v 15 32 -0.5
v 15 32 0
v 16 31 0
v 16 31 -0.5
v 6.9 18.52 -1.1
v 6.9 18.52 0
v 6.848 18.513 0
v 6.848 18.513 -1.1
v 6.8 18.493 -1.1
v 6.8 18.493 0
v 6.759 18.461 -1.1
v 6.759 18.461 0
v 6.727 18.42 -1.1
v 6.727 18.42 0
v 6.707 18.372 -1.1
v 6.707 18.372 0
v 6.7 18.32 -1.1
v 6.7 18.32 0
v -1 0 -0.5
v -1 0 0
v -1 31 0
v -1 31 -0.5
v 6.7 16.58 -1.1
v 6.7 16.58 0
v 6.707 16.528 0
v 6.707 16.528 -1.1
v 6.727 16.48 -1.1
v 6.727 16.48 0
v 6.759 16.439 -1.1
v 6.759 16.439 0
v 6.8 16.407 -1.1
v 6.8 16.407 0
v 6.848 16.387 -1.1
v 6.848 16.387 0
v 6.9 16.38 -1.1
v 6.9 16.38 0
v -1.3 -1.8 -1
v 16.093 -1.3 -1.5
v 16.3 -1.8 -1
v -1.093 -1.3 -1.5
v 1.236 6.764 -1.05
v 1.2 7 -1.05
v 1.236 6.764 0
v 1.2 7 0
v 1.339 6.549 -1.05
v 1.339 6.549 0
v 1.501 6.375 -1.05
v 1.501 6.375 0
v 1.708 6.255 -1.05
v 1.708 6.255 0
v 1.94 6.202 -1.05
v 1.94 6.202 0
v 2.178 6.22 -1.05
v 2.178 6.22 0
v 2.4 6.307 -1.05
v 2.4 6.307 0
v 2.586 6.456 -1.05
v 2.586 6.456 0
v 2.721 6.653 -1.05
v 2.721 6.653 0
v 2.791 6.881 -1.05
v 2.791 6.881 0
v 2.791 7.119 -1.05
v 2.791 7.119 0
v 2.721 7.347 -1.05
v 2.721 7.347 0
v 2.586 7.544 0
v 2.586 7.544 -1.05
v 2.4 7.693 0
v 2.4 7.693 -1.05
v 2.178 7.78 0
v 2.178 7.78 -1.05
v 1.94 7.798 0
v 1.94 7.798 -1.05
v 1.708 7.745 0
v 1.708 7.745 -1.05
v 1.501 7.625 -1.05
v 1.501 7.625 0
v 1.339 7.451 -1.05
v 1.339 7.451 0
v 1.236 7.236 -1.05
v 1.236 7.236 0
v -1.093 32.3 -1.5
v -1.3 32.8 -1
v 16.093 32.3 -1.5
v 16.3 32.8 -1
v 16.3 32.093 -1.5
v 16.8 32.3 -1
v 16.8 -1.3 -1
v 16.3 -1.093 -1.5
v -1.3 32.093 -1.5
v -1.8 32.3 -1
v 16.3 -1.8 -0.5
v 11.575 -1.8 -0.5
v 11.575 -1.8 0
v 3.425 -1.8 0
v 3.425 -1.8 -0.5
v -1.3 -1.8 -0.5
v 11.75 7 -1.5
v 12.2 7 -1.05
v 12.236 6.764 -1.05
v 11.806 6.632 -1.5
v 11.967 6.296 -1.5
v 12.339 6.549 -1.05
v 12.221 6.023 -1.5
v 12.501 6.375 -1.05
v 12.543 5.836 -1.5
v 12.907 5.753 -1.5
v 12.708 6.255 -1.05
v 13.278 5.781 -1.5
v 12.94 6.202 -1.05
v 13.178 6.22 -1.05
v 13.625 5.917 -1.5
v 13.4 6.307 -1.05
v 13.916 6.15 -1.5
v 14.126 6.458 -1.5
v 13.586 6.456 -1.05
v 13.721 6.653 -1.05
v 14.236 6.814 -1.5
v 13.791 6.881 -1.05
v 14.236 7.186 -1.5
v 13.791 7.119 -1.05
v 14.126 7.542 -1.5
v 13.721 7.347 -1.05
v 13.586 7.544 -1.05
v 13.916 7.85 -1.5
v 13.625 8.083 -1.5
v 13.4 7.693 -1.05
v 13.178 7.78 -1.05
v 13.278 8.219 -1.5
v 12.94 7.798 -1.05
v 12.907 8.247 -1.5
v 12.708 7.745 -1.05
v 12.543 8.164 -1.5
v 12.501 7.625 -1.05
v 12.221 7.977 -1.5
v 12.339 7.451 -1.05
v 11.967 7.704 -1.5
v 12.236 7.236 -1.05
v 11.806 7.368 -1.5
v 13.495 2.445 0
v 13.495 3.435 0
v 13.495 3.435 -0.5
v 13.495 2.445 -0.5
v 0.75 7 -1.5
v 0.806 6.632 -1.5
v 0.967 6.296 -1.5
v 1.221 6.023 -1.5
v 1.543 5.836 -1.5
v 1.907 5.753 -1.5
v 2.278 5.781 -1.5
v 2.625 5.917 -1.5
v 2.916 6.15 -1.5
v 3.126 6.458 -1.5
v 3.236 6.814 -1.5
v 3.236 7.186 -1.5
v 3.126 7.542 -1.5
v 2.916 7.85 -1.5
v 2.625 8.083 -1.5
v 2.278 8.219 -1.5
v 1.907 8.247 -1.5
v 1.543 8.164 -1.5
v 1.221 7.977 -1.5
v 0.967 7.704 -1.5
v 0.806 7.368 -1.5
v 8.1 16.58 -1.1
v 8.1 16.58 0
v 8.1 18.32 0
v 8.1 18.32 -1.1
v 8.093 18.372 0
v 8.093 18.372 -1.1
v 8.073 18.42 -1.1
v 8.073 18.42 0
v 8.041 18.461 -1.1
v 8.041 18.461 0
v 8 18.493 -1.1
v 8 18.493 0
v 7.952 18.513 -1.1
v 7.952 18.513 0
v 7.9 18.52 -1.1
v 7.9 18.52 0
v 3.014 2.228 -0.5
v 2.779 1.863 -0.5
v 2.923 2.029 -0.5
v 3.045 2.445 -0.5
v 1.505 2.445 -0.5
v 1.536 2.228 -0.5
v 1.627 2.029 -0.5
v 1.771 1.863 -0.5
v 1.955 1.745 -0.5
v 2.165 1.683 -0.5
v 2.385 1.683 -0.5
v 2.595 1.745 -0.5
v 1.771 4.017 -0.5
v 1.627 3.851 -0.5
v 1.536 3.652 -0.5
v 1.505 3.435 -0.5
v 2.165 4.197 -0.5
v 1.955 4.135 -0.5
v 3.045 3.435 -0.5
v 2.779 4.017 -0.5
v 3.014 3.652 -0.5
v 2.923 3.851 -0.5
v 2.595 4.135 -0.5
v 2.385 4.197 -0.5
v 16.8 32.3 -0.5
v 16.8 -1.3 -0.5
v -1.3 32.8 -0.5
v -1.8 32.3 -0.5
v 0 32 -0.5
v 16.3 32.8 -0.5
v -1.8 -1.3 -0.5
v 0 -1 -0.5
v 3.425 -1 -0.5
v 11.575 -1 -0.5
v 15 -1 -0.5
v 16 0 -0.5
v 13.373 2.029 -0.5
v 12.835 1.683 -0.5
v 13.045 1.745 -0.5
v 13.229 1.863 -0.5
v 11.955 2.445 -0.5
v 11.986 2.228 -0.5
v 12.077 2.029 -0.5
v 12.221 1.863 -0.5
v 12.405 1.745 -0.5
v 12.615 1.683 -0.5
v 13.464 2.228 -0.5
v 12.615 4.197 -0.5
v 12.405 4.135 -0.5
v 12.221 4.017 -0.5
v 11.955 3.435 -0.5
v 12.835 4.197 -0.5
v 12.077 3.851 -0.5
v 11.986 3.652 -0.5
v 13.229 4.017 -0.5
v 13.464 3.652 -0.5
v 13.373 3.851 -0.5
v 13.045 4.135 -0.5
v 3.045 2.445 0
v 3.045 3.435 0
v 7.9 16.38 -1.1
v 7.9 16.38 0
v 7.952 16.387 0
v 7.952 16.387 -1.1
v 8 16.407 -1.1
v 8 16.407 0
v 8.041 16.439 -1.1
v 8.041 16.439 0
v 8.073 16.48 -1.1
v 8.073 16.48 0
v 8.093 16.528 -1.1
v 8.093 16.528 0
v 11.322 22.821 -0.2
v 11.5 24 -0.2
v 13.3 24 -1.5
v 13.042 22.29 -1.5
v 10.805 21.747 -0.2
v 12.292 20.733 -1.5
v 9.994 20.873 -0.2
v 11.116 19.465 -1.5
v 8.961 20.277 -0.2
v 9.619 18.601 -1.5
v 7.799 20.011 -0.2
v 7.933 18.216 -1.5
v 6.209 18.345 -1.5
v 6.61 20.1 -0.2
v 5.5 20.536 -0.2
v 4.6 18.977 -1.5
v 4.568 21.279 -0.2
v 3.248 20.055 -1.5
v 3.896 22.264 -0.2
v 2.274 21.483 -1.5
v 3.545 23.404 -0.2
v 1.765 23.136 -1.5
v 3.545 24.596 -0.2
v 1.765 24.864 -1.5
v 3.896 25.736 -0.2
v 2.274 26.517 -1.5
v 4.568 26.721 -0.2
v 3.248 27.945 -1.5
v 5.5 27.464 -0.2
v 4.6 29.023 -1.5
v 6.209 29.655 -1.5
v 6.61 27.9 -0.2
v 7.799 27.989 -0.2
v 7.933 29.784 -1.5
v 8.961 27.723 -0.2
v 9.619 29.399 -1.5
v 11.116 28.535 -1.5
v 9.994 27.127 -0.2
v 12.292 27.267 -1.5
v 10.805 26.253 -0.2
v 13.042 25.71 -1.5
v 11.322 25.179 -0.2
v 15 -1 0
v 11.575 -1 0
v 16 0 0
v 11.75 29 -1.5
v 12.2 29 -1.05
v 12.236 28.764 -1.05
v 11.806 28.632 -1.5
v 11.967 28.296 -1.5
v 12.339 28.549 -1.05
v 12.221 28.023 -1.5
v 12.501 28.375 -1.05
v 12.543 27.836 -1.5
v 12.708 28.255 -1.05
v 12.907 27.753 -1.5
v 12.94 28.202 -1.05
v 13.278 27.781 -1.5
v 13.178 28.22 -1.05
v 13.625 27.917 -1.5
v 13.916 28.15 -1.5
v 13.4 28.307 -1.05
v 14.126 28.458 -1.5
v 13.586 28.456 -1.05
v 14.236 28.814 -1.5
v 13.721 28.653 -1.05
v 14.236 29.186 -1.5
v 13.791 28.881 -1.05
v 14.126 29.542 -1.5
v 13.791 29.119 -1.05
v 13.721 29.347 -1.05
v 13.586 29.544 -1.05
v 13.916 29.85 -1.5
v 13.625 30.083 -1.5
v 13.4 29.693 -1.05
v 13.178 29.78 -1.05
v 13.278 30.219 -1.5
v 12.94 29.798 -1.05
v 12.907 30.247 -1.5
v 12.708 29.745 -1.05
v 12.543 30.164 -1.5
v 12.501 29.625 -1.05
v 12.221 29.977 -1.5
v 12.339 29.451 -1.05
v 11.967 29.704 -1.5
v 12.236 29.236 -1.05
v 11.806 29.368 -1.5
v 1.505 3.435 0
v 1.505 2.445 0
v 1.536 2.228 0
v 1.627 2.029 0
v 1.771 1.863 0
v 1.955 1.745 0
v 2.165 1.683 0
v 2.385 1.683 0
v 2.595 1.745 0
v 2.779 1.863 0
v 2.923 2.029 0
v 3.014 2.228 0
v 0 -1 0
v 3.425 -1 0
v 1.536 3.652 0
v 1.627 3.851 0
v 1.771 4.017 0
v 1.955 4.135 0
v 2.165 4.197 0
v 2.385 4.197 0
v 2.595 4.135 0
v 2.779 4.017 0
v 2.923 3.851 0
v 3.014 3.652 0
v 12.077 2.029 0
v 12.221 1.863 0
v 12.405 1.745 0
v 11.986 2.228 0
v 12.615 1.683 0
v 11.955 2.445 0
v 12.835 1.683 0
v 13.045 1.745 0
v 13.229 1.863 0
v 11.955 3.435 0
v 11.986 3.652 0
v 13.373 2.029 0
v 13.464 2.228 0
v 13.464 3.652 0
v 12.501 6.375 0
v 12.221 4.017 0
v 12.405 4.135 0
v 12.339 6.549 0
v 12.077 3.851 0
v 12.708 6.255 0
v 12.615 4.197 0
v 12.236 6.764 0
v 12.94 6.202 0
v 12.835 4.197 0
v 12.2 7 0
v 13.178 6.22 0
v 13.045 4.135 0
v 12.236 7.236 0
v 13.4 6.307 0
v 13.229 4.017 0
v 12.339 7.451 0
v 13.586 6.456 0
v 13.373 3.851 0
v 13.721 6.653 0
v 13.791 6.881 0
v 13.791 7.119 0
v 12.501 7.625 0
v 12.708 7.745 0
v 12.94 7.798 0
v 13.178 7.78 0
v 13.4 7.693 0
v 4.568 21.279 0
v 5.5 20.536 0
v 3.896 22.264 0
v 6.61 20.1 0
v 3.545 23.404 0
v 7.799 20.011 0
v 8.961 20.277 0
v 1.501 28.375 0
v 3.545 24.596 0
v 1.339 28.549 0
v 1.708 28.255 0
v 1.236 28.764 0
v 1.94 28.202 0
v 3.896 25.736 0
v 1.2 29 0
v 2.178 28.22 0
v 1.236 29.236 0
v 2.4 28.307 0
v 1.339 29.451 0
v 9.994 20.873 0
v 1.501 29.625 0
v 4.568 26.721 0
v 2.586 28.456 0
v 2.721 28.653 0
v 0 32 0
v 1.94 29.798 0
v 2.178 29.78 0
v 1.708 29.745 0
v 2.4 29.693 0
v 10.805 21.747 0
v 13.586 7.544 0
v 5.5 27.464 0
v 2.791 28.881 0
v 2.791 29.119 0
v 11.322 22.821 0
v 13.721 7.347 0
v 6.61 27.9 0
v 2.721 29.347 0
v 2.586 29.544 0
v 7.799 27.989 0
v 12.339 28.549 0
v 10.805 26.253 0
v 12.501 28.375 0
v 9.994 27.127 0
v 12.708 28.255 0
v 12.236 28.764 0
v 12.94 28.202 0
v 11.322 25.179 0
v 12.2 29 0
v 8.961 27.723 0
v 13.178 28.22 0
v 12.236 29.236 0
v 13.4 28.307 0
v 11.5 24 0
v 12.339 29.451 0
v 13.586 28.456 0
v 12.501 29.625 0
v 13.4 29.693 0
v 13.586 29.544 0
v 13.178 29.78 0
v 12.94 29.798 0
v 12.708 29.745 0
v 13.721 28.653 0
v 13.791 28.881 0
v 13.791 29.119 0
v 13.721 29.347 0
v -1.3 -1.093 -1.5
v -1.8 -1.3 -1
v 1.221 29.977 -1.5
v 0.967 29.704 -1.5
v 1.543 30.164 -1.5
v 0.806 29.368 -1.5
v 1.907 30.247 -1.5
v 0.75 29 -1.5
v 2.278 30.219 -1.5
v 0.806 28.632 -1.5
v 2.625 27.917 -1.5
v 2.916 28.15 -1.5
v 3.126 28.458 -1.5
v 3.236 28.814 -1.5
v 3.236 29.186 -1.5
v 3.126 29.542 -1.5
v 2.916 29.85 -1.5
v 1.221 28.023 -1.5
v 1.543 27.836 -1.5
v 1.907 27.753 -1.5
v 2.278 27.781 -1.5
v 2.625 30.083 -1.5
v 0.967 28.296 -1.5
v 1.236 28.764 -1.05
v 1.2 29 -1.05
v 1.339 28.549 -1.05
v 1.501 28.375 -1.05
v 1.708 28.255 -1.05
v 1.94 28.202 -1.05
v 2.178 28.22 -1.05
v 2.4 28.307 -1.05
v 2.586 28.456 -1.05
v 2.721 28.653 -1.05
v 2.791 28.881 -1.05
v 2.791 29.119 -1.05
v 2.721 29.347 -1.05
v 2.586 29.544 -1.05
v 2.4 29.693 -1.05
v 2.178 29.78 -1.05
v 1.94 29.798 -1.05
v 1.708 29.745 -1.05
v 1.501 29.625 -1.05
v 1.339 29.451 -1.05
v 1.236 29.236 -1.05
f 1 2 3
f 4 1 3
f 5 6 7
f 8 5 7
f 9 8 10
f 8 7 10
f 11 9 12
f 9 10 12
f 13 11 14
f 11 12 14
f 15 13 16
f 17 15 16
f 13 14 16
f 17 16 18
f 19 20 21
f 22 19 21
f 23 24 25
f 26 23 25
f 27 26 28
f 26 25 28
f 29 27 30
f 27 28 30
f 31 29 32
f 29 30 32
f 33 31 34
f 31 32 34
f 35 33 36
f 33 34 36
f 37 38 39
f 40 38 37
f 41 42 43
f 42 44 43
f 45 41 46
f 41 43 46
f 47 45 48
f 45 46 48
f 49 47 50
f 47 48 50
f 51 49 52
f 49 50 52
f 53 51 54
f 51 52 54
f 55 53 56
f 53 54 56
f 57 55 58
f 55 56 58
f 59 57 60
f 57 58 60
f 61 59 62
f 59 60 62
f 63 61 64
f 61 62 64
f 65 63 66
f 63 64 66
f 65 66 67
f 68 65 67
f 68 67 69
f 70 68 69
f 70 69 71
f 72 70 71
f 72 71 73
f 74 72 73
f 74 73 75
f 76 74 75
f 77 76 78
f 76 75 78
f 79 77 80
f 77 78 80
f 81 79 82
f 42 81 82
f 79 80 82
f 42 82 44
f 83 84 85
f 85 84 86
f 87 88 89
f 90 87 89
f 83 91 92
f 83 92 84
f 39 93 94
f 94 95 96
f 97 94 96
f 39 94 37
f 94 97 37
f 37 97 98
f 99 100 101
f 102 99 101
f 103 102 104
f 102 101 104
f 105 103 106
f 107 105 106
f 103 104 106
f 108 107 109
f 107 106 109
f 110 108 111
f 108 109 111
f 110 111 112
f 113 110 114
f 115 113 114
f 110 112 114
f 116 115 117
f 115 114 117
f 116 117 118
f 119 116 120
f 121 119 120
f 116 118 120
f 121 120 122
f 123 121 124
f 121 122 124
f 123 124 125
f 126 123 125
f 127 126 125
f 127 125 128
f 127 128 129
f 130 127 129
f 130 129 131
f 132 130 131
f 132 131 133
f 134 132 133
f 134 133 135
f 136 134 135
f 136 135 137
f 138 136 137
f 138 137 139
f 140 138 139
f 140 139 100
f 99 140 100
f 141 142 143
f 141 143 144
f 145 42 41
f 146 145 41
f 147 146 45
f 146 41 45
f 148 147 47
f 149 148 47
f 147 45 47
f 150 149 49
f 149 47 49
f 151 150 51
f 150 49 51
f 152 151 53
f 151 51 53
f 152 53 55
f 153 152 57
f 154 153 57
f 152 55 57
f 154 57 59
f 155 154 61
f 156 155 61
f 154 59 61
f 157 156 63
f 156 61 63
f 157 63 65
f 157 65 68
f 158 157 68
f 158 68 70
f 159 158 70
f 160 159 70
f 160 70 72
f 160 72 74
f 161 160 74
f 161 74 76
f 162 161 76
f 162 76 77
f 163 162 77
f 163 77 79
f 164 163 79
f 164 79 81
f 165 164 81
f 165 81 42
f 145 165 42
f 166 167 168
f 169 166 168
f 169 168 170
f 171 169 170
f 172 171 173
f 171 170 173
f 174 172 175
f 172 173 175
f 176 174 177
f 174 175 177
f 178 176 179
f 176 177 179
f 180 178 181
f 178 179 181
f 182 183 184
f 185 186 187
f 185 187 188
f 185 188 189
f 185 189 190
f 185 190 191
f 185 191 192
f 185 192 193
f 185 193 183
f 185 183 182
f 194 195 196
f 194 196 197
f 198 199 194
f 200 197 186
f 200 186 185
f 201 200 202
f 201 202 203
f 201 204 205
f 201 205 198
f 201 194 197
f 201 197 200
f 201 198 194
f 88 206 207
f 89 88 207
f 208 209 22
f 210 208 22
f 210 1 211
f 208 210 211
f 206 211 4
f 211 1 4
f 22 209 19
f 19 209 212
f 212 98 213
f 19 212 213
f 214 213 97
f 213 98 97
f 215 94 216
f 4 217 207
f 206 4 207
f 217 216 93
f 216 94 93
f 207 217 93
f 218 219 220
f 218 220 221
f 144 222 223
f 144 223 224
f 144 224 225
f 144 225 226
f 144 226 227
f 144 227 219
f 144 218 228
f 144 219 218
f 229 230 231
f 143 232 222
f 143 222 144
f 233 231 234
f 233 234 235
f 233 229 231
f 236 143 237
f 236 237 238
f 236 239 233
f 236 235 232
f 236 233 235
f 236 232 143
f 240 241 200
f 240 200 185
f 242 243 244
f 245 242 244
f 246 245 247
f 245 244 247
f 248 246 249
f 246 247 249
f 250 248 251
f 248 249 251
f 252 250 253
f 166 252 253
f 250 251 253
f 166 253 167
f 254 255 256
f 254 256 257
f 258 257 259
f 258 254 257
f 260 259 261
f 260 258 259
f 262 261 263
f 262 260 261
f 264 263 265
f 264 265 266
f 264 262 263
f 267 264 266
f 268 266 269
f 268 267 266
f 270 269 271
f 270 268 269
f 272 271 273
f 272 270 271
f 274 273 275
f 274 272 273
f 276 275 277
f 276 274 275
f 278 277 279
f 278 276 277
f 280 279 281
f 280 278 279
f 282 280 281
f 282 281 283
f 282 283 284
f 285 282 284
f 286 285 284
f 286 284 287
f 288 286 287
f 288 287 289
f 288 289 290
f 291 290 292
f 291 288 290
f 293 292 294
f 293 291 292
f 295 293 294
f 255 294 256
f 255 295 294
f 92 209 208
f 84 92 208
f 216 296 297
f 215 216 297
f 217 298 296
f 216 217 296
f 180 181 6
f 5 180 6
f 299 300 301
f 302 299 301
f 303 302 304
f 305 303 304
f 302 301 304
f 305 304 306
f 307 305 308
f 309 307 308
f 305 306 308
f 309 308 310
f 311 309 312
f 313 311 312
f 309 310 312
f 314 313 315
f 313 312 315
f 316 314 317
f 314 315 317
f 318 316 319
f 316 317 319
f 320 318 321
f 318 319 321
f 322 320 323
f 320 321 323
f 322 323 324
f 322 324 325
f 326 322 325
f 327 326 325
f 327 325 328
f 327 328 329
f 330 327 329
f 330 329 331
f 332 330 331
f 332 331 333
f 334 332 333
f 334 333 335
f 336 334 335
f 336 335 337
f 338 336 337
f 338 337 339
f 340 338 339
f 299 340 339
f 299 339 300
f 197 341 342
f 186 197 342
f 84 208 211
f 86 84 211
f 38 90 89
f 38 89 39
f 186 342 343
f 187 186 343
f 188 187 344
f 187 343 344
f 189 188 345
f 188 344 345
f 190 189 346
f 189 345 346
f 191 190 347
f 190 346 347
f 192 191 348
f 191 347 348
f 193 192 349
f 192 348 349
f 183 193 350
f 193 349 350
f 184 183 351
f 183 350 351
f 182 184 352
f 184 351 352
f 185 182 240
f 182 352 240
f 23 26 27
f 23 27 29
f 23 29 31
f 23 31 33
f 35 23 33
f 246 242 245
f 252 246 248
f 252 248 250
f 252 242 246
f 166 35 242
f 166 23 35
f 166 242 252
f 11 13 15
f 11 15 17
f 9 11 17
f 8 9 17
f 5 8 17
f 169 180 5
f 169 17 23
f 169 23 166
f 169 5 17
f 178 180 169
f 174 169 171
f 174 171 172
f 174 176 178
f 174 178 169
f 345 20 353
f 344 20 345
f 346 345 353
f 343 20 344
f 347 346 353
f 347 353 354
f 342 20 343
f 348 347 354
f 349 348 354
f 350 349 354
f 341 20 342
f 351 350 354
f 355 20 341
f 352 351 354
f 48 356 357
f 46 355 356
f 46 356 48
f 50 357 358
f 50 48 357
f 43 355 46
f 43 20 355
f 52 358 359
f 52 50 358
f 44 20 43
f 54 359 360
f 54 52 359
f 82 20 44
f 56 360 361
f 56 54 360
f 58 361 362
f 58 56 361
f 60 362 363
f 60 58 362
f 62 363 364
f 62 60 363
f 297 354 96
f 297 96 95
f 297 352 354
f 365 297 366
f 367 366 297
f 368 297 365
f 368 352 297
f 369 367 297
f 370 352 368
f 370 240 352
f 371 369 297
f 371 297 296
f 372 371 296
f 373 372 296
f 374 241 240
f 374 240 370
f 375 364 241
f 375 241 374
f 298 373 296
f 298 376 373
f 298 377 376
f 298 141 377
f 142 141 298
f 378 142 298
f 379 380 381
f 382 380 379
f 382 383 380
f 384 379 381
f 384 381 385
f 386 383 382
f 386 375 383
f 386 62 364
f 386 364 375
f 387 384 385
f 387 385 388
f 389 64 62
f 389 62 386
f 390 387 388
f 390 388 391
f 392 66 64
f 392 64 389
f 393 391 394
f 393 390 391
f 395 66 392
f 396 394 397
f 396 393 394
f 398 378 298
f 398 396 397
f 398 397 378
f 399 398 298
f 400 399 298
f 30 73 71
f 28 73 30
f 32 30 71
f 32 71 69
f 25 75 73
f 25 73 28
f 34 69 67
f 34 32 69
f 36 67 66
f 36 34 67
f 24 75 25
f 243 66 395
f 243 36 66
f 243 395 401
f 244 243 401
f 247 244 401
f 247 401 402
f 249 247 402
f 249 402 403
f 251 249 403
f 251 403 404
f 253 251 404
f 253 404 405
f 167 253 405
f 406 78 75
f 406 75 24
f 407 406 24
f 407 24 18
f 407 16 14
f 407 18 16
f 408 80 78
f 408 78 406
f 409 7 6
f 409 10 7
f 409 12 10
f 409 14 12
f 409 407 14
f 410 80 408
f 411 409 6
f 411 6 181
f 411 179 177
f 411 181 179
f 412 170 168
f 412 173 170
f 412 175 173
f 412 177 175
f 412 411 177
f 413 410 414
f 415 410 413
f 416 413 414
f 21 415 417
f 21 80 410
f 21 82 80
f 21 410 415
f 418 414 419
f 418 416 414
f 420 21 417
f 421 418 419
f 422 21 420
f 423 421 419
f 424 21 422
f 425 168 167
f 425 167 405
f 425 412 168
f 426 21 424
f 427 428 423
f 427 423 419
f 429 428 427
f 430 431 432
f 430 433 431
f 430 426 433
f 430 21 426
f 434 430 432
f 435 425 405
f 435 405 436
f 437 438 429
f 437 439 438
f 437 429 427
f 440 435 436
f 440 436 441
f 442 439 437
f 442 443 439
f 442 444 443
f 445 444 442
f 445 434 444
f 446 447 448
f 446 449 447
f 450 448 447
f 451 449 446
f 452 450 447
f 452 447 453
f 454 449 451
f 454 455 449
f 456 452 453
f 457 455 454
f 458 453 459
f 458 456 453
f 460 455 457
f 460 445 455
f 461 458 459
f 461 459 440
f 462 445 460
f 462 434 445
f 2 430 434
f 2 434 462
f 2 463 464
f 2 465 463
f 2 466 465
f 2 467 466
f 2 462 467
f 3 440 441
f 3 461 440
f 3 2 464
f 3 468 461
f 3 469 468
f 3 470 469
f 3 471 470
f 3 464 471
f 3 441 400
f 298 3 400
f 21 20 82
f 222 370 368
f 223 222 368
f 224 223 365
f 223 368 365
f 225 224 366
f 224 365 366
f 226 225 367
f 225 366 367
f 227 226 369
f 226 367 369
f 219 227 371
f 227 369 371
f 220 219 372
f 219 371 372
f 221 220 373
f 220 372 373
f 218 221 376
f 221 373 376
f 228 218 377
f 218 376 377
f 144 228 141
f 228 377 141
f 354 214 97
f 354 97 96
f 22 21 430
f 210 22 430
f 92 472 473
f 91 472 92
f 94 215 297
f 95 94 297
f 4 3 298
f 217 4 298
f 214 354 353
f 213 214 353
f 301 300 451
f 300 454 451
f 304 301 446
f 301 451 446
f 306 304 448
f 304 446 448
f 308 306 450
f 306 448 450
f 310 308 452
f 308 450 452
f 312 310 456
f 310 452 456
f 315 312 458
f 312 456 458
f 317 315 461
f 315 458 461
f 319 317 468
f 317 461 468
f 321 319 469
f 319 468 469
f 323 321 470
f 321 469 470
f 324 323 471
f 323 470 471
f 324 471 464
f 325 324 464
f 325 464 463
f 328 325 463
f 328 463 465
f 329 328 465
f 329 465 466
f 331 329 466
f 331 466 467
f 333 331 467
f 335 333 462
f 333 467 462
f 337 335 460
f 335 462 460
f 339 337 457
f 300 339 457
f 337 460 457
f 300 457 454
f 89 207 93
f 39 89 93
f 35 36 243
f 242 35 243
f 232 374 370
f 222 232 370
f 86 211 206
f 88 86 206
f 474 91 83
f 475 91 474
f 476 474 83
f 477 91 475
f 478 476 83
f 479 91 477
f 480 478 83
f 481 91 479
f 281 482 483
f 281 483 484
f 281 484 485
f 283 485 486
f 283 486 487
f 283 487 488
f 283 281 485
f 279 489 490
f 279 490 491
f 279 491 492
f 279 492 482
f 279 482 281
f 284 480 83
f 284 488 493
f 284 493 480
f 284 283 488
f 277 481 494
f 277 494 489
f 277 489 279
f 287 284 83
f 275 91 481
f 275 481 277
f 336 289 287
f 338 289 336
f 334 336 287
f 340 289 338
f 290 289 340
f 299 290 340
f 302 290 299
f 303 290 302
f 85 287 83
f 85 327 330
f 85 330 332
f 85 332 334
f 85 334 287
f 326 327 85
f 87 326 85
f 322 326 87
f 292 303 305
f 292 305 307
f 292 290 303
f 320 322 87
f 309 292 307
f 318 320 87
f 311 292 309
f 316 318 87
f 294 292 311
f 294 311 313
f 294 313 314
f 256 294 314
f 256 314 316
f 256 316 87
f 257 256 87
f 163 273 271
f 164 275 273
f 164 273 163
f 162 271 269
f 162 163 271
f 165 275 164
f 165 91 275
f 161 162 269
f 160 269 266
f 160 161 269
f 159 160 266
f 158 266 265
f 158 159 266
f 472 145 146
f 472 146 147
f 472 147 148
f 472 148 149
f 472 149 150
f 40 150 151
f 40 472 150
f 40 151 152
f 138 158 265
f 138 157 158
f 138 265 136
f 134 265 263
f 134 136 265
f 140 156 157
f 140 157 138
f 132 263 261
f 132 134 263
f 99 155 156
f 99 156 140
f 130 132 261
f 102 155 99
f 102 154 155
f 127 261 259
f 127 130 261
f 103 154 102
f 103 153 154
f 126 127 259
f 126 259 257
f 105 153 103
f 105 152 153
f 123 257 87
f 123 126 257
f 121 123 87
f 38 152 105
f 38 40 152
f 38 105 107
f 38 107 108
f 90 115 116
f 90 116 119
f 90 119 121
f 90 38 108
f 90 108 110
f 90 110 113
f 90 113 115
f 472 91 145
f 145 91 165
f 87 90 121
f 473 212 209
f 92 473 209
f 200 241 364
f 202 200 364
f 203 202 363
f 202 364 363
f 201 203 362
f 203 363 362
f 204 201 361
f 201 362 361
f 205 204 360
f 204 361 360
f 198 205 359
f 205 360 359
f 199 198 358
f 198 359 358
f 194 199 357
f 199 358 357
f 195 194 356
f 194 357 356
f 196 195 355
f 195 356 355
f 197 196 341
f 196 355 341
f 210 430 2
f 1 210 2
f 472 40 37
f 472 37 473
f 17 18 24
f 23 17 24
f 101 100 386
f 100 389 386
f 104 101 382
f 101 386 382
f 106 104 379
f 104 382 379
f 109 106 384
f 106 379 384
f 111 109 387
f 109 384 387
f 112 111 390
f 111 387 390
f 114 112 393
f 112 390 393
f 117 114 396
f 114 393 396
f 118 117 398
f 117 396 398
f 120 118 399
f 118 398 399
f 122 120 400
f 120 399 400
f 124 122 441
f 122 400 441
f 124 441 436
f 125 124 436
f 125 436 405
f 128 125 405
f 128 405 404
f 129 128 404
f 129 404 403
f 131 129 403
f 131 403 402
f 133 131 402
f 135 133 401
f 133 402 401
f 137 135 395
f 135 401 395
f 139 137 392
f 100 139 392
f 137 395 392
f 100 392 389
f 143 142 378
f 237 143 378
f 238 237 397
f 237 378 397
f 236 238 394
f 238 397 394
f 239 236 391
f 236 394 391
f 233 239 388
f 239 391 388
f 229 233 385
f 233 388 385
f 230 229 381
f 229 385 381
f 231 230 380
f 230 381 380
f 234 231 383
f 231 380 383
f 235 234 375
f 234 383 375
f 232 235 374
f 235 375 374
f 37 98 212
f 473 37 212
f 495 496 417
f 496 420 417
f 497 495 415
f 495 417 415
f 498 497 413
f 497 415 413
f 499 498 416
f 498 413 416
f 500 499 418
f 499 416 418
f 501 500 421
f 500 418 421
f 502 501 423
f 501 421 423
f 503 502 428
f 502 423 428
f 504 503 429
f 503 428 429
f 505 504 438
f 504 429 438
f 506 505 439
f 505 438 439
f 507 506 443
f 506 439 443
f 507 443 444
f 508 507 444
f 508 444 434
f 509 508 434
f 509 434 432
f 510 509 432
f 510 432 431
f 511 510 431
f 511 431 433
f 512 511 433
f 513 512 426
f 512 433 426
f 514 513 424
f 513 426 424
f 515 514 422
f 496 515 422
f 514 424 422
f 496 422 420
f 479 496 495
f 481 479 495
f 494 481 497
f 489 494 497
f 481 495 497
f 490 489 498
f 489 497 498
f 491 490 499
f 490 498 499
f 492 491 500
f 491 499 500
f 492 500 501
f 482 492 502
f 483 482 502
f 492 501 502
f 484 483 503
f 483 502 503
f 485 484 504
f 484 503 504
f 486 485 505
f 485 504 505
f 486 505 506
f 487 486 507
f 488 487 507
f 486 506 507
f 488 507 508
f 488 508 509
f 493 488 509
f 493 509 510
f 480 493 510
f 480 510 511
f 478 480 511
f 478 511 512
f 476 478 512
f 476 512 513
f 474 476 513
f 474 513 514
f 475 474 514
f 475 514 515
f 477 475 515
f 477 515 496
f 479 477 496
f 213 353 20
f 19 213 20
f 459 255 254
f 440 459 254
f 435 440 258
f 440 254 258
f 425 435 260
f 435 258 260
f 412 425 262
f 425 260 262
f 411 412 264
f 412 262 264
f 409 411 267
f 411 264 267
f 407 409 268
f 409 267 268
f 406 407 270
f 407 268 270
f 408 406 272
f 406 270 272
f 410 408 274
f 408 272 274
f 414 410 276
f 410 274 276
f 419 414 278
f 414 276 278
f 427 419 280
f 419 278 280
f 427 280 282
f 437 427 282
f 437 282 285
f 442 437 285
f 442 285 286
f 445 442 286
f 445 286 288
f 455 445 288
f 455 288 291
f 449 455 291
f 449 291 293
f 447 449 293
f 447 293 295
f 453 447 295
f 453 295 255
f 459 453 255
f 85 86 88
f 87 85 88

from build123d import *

# Parameters (mm, degrees)
PAD007_DEPTH     = 0.5
PAD008_DEPTH     = 1
SKETCH013_W      = 8.15
SKETCH013_H      = 0.5
PAD009_DEPTH     = 0.8
CHAMFER002_SIZE  = 0.5
HOLE_D           = 1.6
HOLE_DEPTH       = 25
HOLE_CSINK_D     = 2.5
HOLE_CSINK_ANGLE = 90
POCKET003_DEPTH  = 1.1
SKETCH016_R      = 4
POCKET004_DEPTH  = 5
POCKET005_DEPTH  = 0.5
CHAMFER006_SIZE2 = 1.3
CHAMFER006_SIZE  = 1.8


with BuildPart() as part:
    # Sketch011 (on Face14 of Binder001) → Pad007 (new body)
    with BuildSketch(Plane(origin=(0, 0, 0), x_dir=(1, 0, 0), z_dir=(0, 0, -1))):
        Polygon((16, -31), (16, 0), (15, 1), (0, 1), (-1, 0), (-1, -31), (0, -32), (15, -32), align=None)
    extrude(amount=PAD007_DEPTH)

    # Sketch012 (on Face10 of Pad007) → Pad008 (join)
    with BuildSketch(Plane(origin=(0, 0, -0.5), x_dir=(1, 0, 0), z_dir=(0, 0, -1))):
        Polygon((-1.3, 1.8), (-1.8, 1.3), (-1.8, -32.3), (-1.3, -32.8), (16.3, -32.8), (16.8, -32.3), (16.8, 1.3), (16.3, 1.8), align=None)
    extrude(amount=PAD008_DEPTH)

    # Sketch013 (on Face7 of Pad008) → Pad009 (join)
    with BuildSketch(Plane.XZ.offset(1)):
        with Locations((7.5, -0.25)):
            Rectangle(SKETCH013_W, SKETCH013_H)
    extrude(amount=PAD009_DEPTH)

    # Chamfer002
    chamfer002_edges = [part.edges().sort_by_distance(p)[0] for p in [
        (-1.55, -1.55, -1.5),
        (-1.8, 15.5, -1.5),
        (-1.55, 32.55, -1.5),
        (7.5, 32.8, -1.5),
        (16.55, 32.55, -1.5),
        (16.8, 15.5, -1.5),
        (16.55, -1.55, -1.5),
        (7.5, -1.8, -1.5),
    ]]
    chamfer(chamfer002_edges, length=CHAMFER002_SIZE)

    # Hole
    with Locations(Plane(origin=(0, 0, -1.5), x_dir=(1, 0, 0), z_dir=(0, 0, -1))):
        with Locations((2, -7), (13, -7), (2, -29), (13, -29)):
            CounterSinkHole(HOLE_D / 2, HOLE_CSINK_D / 2, depth=HOLE_DEPTH, counter_sink_angle=HOLE_CSINK_ANGLE)

    # Sketch015 (on Face9 of Hole) → Pocket003 (cut)
    with BuildSketch(Plane.XY):
        with BuildLine():
            Line((8.1, 16.58), (8.1, 18.32))
            ThreePointArc((8.1, 18.32), (8.041421, 18.461421), (7.9, 18.52))
            Line((7.9, 18.52), (6.9, 18.52))
            ThreePointArc((6.9, 18.52), (6.758579, 18.461421), (6.7, 18.32))
            Line((6.7, 18.32), (6.7, 16.58))
            ThreePointArc((6.7, 16.58), (6.758579, 16.438579), (6.9, 16.38))
            Line((6.9, 16.38), (7.9, 16.38))
            ThreePointArc((7.9, 16.38), (8.041421, 16.438579), (8.1, 16.58))
        make_face()
    extrude(amount=-POCKET003_DEPTH, mode=Mode.SUBTRACT)

    # Sketch016 (on Face11 of Pocket003) → Pocket004 (cut)
    with BuildSketch(Plane(origin=(0, 0, -1.5), x_dir=(1, 0, 0), z_dir=(0, 0, -1))):
        with Locations((7.5, -24)):
            Circle(SKETCH016_R)
    extrude(amount=-POCKET004_DEPTH, mode=Mode.SUBTRACT)

    # Sketch017 → Pocket005 (cut)
    with BuildSketch(Plane.XY):
        with BuildLine():
            ThreePointArc((3.045, 3.435), (2.275, 4.205), (1.505, 3.435))
            Line((1.505, 3.435), (1.505, 2.445))
            ThreePointArc((1.505, 2.445), (2.275, 1.675), (3.045, 2.445))
            Line((3.045, 3.435), (3.045, 2.445))
        make_face()
        with BuildLine():
            ThreePointArc((13.495, 3.435), (12.725, 4.205), (11.955, 3.435))
            Line((11.955, 3.435), (11.955, 2.445))
            ThreePointArc((11.955, 2.445), (12.725, 1.675), (13.495, 2.445))
            Line((13.495, 3.435), (13.495, 2.445))
        make_face()
    extrude(amount=-POCKET005_DEPTH, mode=Mode.SUBTRACT)

    # Chamfer006
    chamfer006_edges = [part.edges().sort_by_distance(p)[0] for p in [
        (3.5, 24, -1.5),
    ]]
    chamfer006_side = part.faces().sort_by_distance((7.5, 14.586368, -1.5))[0]
    chamfer(chamfer006_edges, length=CHAMFER006_SIZE, length2=CHAMFER006_SIZE2, reference=chamfer006_side)


solid = part.part
